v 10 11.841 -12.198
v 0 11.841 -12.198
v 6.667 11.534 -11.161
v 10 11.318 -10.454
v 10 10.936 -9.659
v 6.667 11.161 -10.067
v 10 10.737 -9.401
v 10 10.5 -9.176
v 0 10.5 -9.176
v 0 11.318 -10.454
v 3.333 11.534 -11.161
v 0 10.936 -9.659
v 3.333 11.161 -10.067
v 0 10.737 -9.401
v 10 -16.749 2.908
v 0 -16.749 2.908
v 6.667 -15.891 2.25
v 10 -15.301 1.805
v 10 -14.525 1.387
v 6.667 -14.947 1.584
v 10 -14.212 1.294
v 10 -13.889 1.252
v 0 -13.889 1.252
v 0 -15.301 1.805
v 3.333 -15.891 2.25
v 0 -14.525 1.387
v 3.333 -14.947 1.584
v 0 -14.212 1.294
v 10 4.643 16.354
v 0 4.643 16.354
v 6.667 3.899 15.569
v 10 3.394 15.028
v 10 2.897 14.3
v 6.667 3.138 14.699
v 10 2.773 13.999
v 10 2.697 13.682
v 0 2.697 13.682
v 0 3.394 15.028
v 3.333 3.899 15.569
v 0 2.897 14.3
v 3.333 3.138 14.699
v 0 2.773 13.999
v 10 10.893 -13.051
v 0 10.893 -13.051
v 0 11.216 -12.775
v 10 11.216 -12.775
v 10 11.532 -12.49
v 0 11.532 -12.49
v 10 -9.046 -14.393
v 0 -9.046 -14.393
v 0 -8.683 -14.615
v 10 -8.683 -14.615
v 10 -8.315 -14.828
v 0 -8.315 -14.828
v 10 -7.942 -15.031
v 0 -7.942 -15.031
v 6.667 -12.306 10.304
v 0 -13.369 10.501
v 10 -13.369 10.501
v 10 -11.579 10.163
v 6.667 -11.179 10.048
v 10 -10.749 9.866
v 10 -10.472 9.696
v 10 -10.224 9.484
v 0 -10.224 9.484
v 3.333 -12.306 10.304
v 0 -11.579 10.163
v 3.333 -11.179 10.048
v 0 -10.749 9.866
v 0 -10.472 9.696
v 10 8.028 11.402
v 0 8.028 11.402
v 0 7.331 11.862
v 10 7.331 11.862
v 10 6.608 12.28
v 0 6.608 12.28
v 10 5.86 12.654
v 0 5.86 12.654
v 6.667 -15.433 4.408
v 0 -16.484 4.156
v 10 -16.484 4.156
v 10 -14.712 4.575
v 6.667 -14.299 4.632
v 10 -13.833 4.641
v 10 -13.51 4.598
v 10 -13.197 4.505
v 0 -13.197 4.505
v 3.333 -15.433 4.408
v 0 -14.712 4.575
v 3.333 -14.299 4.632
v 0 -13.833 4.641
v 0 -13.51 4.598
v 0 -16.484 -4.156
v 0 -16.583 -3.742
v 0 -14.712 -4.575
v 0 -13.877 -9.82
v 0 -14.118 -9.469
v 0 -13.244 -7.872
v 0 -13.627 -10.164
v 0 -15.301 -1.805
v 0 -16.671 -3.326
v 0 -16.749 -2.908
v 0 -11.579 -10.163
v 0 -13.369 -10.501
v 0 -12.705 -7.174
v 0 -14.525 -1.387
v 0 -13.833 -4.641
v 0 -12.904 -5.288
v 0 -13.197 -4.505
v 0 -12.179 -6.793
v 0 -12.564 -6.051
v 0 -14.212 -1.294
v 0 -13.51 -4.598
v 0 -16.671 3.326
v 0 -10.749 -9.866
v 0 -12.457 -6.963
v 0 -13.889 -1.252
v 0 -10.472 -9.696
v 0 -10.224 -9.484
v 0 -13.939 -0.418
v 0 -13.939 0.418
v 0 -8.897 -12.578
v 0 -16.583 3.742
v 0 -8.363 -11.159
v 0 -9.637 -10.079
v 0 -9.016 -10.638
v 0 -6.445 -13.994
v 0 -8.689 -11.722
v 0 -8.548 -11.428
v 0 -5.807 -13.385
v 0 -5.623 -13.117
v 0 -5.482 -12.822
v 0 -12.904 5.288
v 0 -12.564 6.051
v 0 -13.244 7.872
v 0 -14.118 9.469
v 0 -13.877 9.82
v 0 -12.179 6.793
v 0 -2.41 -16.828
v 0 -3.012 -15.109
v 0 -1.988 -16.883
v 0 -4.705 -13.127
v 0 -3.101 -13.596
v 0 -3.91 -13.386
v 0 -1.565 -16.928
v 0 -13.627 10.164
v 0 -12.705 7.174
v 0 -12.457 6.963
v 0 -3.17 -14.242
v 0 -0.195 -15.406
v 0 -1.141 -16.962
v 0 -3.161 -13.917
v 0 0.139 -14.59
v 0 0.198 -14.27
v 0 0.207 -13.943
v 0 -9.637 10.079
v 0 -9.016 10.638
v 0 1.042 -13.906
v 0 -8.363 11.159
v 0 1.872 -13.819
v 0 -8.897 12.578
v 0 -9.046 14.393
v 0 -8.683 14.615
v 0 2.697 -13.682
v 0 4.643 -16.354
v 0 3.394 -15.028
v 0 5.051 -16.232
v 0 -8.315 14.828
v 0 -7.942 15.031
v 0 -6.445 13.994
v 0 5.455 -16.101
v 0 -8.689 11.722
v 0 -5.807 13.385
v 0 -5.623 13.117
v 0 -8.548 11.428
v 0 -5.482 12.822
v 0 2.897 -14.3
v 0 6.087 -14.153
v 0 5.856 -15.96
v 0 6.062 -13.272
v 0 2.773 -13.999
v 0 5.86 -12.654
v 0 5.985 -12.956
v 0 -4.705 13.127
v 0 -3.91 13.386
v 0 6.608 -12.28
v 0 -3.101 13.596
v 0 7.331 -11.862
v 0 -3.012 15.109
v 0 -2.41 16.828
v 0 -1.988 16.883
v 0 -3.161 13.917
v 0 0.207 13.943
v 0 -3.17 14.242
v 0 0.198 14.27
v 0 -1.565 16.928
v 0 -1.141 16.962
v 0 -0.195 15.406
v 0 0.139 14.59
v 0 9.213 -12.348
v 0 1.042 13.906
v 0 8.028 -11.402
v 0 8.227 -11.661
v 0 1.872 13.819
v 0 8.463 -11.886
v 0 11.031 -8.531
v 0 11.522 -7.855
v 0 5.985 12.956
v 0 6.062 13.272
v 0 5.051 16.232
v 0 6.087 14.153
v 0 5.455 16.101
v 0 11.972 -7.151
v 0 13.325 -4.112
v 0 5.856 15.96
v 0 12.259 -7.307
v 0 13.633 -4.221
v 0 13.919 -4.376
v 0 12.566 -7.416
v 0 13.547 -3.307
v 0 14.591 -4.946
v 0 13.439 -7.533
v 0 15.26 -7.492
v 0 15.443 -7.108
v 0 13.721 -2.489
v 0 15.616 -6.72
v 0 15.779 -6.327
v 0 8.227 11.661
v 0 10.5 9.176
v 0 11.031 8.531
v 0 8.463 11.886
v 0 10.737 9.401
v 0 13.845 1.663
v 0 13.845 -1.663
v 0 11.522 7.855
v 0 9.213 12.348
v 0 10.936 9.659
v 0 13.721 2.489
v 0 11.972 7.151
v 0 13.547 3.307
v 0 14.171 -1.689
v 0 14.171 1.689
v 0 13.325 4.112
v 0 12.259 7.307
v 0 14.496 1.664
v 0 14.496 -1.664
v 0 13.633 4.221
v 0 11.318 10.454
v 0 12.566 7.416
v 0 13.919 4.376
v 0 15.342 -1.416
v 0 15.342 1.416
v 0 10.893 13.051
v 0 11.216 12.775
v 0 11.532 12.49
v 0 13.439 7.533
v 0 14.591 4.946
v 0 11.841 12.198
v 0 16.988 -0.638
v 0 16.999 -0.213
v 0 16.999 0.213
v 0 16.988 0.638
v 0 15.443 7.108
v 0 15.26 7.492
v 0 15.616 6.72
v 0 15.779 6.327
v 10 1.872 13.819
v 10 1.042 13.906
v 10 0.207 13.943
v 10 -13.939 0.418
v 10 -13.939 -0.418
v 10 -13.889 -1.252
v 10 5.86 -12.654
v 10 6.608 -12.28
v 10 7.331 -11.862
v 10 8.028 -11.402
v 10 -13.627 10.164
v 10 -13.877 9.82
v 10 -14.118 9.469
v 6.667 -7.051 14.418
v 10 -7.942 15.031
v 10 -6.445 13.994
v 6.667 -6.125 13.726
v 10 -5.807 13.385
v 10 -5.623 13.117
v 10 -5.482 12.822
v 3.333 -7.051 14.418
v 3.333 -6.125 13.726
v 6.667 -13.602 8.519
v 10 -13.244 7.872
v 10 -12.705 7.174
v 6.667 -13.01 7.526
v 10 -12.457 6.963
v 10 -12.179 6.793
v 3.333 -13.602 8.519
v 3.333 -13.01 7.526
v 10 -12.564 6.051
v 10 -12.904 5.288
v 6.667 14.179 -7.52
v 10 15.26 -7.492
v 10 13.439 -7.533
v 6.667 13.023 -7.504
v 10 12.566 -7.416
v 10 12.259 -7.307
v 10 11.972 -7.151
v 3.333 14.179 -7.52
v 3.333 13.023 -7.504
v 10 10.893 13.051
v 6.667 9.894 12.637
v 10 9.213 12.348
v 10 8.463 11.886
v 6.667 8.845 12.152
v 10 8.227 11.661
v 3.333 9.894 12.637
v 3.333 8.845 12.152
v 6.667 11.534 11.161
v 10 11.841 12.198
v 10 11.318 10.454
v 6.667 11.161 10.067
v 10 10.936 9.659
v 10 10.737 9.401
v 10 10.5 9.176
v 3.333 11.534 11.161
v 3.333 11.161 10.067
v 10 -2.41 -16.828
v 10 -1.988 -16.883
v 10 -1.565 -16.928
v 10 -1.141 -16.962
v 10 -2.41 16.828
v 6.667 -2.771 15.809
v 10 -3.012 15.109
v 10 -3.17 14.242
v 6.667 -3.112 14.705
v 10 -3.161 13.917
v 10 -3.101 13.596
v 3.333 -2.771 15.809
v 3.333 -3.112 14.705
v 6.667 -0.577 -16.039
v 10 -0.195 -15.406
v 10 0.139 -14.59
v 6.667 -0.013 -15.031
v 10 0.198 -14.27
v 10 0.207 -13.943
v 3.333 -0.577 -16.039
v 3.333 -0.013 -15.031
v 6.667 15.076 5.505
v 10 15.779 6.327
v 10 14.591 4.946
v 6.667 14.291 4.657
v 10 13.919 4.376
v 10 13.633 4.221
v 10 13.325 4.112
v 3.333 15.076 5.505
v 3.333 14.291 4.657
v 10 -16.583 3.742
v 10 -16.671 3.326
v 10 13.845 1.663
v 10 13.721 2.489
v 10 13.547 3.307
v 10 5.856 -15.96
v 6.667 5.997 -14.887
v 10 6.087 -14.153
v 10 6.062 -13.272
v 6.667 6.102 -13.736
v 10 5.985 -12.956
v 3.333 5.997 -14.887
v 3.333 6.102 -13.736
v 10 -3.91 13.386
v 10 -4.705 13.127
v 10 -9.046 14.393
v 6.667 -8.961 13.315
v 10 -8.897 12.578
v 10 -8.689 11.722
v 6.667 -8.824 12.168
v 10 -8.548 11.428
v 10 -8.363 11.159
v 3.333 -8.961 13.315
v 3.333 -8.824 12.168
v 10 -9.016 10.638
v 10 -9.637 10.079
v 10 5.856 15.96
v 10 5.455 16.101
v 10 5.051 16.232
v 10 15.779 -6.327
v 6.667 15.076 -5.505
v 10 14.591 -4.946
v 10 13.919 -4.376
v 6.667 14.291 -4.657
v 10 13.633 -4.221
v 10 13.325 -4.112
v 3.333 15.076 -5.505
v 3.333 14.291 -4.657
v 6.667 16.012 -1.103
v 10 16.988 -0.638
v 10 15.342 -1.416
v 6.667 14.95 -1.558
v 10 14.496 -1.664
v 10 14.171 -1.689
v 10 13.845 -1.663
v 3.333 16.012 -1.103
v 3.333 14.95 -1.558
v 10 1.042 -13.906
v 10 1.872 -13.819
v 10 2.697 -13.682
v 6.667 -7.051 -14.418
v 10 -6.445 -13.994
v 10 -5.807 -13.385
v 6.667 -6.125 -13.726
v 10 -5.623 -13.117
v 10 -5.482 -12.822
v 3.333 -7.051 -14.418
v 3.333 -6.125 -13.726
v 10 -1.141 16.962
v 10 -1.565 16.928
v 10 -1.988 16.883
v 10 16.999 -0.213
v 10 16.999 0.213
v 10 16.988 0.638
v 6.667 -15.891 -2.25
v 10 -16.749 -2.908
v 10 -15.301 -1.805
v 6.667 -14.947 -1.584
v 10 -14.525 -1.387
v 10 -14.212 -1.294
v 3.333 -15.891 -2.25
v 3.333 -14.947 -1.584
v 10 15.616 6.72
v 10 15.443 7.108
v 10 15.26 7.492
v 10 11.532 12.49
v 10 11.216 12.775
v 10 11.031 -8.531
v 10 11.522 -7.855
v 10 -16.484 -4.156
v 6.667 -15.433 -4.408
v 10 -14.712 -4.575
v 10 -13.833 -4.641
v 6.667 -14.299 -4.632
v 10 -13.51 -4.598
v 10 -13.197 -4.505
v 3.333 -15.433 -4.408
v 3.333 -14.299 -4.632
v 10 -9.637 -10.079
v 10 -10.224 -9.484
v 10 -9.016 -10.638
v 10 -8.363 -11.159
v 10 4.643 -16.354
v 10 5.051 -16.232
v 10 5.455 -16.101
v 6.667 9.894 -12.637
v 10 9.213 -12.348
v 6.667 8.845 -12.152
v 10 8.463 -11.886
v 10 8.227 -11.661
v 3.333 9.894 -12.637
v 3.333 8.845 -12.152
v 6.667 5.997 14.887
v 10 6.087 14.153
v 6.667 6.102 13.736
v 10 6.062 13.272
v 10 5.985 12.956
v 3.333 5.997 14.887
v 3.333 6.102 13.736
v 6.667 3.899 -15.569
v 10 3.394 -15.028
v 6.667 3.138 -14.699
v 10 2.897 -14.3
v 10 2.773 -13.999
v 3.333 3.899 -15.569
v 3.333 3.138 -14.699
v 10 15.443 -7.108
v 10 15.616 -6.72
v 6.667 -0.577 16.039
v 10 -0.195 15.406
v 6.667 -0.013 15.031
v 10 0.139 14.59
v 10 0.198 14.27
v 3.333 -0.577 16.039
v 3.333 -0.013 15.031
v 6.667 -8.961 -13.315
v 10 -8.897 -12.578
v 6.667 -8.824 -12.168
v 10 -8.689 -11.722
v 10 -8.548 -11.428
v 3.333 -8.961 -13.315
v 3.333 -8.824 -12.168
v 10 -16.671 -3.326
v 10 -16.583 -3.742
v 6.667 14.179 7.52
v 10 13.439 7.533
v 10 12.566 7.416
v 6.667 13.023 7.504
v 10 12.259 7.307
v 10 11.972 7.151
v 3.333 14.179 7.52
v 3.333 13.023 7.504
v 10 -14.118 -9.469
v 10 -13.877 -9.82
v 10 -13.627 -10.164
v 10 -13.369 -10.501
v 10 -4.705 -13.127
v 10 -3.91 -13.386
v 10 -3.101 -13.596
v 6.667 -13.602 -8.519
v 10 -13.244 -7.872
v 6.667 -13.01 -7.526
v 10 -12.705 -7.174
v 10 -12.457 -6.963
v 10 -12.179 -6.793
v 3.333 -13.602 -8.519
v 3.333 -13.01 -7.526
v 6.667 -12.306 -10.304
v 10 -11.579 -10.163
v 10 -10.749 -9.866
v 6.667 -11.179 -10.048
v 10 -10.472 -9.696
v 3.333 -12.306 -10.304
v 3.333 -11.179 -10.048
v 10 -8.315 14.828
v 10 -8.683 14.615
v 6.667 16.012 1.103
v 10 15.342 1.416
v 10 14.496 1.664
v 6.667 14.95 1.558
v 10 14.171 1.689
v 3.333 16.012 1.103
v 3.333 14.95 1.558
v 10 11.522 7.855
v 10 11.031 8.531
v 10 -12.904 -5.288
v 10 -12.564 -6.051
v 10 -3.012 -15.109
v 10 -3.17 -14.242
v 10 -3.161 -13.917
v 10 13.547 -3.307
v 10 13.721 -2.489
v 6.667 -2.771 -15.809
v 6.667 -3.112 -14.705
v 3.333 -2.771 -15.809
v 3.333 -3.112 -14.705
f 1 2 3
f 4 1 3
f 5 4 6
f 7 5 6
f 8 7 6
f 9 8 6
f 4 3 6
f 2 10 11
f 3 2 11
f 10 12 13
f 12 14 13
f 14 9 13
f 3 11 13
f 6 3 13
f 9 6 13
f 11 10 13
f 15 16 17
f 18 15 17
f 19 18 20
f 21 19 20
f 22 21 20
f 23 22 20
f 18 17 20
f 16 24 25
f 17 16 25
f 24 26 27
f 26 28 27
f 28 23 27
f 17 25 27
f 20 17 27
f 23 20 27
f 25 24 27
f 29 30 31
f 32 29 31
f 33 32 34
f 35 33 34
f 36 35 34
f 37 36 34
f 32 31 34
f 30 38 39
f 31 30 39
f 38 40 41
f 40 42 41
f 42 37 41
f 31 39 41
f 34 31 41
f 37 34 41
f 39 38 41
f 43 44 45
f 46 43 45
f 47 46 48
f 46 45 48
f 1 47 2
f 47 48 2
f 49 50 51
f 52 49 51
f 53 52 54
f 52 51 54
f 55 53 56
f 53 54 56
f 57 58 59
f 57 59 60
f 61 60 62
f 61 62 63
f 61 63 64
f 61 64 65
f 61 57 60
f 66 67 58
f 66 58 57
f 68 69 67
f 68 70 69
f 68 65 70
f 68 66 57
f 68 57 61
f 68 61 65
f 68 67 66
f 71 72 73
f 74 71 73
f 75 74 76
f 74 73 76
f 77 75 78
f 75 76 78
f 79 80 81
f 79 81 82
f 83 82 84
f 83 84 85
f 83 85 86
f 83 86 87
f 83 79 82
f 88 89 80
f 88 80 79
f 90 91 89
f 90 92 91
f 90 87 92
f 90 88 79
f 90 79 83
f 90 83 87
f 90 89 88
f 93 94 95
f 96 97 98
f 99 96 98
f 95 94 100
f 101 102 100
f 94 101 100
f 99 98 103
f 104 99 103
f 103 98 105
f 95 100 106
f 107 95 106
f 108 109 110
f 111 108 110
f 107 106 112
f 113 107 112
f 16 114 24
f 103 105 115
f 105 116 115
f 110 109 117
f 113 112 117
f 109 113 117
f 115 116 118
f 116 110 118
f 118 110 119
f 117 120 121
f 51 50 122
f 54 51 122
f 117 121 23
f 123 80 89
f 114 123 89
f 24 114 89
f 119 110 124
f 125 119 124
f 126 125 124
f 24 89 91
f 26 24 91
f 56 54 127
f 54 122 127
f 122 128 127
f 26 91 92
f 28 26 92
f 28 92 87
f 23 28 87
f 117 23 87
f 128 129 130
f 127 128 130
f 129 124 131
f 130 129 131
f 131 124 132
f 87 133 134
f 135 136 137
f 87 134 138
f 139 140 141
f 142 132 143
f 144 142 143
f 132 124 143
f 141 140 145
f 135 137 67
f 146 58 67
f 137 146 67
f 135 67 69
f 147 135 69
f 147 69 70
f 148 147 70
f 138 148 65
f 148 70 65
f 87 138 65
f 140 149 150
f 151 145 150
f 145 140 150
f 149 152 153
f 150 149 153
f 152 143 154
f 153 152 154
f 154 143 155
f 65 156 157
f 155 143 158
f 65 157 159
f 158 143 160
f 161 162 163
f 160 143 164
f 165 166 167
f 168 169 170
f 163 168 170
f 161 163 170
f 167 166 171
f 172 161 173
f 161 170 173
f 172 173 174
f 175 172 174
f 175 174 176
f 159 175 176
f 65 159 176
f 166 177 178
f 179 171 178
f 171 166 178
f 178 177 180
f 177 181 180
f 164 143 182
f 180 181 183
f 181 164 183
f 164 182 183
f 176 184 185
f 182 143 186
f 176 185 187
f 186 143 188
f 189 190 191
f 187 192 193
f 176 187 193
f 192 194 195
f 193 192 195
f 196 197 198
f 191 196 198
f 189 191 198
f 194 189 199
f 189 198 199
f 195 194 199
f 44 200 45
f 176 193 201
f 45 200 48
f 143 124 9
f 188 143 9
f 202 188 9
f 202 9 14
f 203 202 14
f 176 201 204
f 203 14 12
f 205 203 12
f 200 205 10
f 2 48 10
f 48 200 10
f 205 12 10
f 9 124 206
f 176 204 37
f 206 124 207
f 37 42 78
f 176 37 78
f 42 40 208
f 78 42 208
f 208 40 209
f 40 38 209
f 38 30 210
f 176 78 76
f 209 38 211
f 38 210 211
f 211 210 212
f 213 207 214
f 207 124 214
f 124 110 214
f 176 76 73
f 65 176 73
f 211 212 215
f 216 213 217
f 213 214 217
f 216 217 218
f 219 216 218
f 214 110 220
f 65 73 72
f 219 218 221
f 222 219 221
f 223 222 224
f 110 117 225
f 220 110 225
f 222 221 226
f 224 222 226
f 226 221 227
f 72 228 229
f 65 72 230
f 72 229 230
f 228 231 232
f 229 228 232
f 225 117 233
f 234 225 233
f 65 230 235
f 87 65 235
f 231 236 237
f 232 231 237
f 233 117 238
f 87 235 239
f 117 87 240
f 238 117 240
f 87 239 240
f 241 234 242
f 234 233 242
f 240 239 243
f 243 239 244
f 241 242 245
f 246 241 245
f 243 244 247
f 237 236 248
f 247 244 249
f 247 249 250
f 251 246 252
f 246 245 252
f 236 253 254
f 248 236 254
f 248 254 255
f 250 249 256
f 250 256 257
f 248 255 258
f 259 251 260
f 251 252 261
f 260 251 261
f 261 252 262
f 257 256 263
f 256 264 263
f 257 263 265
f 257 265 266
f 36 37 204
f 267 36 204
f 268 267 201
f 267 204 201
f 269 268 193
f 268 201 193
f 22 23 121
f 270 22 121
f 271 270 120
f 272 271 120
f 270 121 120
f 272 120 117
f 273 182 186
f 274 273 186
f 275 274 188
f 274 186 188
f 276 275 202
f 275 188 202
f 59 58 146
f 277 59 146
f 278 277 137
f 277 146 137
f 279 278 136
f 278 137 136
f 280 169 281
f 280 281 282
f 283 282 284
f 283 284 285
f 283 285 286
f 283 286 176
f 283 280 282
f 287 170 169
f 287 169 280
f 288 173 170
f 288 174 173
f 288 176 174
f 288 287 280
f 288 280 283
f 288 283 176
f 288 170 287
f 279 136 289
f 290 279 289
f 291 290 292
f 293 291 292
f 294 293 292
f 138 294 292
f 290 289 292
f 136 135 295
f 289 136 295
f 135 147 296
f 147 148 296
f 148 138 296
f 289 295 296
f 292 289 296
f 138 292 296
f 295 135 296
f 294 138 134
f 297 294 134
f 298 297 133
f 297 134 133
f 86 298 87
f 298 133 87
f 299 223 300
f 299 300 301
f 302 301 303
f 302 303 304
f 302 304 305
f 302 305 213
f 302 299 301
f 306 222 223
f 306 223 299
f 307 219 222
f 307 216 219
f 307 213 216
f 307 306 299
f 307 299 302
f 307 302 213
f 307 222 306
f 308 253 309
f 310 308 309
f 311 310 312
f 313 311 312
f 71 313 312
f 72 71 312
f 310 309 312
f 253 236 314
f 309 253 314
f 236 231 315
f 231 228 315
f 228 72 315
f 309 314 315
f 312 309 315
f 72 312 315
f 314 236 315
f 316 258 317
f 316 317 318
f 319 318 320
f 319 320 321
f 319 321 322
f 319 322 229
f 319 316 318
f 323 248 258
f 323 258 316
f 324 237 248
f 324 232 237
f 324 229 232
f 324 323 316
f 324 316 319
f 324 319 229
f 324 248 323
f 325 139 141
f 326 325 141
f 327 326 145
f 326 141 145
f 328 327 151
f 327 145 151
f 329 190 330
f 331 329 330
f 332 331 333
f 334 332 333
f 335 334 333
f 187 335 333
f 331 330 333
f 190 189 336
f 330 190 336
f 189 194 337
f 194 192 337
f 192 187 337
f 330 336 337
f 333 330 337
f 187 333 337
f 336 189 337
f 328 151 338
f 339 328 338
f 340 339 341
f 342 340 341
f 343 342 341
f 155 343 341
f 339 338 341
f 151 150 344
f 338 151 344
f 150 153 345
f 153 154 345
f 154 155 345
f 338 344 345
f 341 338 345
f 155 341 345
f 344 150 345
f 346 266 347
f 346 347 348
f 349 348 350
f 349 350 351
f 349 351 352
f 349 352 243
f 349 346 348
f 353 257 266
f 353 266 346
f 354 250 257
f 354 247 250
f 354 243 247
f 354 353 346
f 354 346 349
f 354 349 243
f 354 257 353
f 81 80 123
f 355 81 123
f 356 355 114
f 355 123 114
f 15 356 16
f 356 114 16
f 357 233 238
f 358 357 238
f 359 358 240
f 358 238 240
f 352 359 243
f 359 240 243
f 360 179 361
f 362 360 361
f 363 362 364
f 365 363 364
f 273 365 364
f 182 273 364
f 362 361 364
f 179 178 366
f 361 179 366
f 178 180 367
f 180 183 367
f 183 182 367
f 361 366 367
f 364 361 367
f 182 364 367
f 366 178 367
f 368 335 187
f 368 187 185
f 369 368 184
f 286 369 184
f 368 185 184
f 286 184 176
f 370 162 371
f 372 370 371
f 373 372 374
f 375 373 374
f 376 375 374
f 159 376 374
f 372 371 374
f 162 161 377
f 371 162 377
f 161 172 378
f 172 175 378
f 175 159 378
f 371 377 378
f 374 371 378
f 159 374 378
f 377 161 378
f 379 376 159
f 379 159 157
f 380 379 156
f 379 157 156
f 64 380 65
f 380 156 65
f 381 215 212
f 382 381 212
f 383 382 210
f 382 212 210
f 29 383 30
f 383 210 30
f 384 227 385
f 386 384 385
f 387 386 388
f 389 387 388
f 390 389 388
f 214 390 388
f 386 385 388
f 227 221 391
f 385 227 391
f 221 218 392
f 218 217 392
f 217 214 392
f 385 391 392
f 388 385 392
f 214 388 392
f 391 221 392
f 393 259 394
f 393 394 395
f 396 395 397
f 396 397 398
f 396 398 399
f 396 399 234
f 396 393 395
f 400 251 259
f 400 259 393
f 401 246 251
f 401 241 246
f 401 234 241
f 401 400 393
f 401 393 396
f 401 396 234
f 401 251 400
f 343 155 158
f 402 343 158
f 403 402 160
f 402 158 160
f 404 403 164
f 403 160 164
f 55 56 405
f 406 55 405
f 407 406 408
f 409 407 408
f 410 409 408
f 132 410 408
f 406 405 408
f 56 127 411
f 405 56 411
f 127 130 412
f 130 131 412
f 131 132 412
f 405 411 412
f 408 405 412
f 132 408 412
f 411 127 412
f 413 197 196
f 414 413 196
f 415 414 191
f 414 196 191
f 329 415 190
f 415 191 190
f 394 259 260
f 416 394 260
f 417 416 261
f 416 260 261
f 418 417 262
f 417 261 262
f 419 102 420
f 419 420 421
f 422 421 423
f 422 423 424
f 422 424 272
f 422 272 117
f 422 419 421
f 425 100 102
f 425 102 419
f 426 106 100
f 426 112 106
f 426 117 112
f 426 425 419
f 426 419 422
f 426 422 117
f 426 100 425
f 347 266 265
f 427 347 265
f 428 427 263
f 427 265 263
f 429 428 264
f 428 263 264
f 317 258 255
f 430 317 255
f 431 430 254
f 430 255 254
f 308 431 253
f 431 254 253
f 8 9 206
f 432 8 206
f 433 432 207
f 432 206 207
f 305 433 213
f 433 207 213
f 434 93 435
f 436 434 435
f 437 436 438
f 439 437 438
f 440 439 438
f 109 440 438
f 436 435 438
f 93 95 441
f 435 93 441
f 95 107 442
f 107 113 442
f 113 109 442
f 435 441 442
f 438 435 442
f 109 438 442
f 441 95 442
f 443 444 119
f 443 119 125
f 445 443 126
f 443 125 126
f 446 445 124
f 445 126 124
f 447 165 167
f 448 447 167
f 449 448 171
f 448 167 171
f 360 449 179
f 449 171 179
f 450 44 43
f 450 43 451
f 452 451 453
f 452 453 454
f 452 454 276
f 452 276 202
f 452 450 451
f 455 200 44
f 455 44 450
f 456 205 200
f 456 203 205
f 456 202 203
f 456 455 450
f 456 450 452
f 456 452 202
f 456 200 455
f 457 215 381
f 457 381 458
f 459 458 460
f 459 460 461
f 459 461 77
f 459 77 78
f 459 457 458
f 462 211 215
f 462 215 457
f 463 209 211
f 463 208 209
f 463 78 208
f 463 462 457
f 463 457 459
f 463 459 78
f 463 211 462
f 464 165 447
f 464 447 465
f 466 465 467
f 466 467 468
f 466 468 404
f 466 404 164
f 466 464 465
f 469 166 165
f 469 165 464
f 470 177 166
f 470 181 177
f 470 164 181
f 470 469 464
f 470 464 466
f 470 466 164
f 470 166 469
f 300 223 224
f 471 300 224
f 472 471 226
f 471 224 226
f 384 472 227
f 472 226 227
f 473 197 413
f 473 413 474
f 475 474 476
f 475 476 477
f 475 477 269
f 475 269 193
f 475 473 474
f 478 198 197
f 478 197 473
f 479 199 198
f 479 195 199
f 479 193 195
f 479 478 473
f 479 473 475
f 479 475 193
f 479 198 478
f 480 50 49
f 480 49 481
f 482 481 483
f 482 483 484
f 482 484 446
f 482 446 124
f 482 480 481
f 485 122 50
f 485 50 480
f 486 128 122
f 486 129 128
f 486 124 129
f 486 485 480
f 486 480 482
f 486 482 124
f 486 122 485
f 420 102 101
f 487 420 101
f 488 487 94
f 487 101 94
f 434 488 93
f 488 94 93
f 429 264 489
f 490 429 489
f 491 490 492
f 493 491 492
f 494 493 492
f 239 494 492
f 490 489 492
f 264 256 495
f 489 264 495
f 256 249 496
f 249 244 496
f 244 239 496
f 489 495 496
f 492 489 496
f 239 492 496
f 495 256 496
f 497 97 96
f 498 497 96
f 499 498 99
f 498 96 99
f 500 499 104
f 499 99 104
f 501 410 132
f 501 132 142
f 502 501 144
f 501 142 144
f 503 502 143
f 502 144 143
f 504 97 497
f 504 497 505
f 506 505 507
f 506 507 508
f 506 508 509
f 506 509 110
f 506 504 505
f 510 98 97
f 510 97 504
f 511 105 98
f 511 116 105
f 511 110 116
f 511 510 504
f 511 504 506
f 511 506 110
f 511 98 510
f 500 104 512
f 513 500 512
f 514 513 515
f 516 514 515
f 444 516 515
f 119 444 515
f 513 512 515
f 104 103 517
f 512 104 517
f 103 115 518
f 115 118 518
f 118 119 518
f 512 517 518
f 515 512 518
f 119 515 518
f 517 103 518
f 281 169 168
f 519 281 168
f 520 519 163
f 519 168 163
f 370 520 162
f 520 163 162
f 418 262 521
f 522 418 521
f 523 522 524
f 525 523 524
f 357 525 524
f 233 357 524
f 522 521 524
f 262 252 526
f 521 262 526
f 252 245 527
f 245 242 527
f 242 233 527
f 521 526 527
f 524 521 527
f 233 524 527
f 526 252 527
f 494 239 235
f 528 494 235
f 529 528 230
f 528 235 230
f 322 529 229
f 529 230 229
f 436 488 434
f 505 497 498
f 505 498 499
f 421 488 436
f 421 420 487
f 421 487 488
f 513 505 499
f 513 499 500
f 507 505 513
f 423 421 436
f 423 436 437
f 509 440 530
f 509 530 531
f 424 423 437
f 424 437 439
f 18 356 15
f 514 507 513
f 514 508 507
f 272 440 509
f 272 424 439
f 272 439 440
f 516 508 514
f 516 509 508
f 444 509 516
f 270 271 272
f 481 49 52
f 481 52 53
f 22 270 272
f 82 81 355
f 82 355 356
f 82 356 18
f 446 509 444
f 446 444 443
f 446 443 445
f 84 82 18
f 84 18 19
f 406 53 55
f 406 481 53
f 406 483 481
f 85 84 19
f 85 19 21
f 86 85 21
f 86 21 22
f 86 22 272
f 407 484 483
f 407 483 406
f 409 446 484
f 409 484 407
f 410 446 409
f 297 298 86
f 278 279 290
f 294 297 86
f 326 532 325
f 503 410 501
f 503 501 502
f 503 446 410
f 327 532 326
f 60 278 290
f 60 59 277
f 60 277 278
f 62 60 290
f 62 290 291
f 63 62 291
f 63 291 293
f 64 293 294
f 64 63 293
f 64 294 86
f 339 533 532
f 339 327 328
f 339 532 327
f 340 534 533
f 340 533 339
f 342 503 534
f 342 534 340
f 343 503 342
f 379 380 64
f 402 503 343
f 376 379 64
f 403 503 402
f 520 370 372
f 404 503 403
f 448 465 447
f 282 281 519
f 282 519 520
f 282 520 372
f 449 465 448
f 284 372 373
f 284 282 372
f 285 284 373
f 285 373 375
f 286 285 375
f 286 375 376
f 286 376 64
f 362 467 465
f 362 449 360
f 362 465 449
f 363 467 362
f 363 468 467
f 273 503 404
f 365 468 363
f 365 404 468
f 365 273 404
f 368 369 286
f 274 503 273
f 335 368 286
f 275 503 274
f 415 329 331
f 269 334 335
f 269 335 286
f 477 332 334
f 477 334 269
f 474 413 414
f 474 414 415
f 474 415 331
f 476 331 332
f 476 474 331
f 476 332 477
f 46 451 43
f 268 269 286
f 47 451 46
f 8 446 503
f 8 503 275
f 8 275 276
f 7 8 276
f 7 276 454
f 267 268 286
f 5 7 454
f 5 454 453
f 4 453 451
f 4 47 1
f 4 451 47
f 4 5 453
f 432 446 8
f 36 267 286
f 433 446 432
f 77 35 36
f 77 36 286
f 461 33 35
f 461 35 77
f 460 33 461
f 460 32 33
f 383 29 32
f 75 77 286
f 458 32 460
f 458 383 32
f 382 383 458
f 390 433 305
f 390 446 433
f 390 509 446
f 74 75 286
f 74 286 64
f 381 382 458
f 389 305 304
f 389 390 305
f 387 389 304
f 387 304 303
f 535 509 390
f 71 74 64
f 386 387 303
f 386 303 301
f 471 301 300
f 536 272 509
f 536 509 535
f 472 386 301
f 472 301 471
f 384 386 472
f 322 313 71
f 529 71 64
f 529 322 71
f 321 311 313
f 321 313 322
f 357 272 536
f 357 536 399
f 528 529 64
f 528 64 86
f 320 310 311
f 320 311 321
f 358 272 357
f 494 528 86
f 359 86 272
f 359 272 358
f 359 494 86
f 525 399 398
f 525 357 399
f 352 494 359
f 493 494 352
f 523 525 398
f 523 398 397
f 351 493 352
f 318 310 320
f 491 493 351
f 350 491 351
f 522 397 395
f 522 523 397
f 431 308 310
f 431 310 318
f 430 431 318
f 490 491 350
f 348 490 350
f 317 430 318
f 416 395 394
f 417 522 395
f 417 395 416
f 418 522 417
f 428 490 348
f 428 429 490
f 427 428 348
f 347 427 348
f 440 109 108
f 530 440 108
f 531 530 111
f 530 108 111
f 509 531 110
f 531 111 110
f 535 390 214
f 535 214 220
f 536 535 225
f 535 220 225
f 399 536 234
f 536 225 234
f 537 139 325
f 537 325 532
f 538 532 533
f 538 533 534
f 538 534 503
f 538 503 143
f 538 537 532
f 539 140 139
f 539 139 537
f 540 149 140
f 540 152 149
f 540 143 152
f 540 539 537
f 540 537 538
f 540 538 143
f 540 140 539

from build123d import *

# Parameters (mm, degrees)
BOSS_EXTRUDE1_DEPTH = 10
CIRPATTERN1_COUNT   = 15


with BuildPart() as part:
    # Sketch3 → Boss-Extrude1 (new body)
    with BuildSketch(Plane.YZ):
        with BuildLine():
            ThreePointArc((-1.141482098, 16.961633725), (-1.776983876, 16.906872221), (-2.409983971, 16.828308806))
            add(Edge.make_bspline(
                [(-2.409983971, 16.828308806), (-2.668426254, 15.877904884), (-3.400287418, 14.680650879), (-3.101338611, 13.595689764)],
                knots=[0.02683822, 0.02683822, 0.02683822, 0.02683822, 1.045667648, 1.045667648, 1.045667648, 1.045667648], degree=3))
            ThreePointArc((-3.101338611, 13.595689764), (1.457642136, -13.868538522), (0.206864074, 13.943395877))
            add(Edge.make_bspline(
                [(-1.141482098, 16.961633725), (-0.691087313, 16.085731582), (0.273704033, 15.066802941), (0.206864074, 13.943395877)],
                knots=[0.02683822, 0.02683822, 0.02683822, 0.02683822, 1.045667648, 1.045667648, 1.045667648, 1.045667648], degree=3))
        make_face()
    boss_extrude1 = extrude(amount=BOSS_EXTRUDE1_DEPTH)

    # CirPattern1: Boss-Extrude1 ×15 about axis
    cirpattern1_axis = Axis((10, 0, 0), (1, 0, 0))
    for i in range(1, CIRPATTERN1_COUNT):
        add(boss_extrude1.rotate(cirpattern1_axis, i * 360 / CIRPATTERN1_COUNT))


solid = part.part
